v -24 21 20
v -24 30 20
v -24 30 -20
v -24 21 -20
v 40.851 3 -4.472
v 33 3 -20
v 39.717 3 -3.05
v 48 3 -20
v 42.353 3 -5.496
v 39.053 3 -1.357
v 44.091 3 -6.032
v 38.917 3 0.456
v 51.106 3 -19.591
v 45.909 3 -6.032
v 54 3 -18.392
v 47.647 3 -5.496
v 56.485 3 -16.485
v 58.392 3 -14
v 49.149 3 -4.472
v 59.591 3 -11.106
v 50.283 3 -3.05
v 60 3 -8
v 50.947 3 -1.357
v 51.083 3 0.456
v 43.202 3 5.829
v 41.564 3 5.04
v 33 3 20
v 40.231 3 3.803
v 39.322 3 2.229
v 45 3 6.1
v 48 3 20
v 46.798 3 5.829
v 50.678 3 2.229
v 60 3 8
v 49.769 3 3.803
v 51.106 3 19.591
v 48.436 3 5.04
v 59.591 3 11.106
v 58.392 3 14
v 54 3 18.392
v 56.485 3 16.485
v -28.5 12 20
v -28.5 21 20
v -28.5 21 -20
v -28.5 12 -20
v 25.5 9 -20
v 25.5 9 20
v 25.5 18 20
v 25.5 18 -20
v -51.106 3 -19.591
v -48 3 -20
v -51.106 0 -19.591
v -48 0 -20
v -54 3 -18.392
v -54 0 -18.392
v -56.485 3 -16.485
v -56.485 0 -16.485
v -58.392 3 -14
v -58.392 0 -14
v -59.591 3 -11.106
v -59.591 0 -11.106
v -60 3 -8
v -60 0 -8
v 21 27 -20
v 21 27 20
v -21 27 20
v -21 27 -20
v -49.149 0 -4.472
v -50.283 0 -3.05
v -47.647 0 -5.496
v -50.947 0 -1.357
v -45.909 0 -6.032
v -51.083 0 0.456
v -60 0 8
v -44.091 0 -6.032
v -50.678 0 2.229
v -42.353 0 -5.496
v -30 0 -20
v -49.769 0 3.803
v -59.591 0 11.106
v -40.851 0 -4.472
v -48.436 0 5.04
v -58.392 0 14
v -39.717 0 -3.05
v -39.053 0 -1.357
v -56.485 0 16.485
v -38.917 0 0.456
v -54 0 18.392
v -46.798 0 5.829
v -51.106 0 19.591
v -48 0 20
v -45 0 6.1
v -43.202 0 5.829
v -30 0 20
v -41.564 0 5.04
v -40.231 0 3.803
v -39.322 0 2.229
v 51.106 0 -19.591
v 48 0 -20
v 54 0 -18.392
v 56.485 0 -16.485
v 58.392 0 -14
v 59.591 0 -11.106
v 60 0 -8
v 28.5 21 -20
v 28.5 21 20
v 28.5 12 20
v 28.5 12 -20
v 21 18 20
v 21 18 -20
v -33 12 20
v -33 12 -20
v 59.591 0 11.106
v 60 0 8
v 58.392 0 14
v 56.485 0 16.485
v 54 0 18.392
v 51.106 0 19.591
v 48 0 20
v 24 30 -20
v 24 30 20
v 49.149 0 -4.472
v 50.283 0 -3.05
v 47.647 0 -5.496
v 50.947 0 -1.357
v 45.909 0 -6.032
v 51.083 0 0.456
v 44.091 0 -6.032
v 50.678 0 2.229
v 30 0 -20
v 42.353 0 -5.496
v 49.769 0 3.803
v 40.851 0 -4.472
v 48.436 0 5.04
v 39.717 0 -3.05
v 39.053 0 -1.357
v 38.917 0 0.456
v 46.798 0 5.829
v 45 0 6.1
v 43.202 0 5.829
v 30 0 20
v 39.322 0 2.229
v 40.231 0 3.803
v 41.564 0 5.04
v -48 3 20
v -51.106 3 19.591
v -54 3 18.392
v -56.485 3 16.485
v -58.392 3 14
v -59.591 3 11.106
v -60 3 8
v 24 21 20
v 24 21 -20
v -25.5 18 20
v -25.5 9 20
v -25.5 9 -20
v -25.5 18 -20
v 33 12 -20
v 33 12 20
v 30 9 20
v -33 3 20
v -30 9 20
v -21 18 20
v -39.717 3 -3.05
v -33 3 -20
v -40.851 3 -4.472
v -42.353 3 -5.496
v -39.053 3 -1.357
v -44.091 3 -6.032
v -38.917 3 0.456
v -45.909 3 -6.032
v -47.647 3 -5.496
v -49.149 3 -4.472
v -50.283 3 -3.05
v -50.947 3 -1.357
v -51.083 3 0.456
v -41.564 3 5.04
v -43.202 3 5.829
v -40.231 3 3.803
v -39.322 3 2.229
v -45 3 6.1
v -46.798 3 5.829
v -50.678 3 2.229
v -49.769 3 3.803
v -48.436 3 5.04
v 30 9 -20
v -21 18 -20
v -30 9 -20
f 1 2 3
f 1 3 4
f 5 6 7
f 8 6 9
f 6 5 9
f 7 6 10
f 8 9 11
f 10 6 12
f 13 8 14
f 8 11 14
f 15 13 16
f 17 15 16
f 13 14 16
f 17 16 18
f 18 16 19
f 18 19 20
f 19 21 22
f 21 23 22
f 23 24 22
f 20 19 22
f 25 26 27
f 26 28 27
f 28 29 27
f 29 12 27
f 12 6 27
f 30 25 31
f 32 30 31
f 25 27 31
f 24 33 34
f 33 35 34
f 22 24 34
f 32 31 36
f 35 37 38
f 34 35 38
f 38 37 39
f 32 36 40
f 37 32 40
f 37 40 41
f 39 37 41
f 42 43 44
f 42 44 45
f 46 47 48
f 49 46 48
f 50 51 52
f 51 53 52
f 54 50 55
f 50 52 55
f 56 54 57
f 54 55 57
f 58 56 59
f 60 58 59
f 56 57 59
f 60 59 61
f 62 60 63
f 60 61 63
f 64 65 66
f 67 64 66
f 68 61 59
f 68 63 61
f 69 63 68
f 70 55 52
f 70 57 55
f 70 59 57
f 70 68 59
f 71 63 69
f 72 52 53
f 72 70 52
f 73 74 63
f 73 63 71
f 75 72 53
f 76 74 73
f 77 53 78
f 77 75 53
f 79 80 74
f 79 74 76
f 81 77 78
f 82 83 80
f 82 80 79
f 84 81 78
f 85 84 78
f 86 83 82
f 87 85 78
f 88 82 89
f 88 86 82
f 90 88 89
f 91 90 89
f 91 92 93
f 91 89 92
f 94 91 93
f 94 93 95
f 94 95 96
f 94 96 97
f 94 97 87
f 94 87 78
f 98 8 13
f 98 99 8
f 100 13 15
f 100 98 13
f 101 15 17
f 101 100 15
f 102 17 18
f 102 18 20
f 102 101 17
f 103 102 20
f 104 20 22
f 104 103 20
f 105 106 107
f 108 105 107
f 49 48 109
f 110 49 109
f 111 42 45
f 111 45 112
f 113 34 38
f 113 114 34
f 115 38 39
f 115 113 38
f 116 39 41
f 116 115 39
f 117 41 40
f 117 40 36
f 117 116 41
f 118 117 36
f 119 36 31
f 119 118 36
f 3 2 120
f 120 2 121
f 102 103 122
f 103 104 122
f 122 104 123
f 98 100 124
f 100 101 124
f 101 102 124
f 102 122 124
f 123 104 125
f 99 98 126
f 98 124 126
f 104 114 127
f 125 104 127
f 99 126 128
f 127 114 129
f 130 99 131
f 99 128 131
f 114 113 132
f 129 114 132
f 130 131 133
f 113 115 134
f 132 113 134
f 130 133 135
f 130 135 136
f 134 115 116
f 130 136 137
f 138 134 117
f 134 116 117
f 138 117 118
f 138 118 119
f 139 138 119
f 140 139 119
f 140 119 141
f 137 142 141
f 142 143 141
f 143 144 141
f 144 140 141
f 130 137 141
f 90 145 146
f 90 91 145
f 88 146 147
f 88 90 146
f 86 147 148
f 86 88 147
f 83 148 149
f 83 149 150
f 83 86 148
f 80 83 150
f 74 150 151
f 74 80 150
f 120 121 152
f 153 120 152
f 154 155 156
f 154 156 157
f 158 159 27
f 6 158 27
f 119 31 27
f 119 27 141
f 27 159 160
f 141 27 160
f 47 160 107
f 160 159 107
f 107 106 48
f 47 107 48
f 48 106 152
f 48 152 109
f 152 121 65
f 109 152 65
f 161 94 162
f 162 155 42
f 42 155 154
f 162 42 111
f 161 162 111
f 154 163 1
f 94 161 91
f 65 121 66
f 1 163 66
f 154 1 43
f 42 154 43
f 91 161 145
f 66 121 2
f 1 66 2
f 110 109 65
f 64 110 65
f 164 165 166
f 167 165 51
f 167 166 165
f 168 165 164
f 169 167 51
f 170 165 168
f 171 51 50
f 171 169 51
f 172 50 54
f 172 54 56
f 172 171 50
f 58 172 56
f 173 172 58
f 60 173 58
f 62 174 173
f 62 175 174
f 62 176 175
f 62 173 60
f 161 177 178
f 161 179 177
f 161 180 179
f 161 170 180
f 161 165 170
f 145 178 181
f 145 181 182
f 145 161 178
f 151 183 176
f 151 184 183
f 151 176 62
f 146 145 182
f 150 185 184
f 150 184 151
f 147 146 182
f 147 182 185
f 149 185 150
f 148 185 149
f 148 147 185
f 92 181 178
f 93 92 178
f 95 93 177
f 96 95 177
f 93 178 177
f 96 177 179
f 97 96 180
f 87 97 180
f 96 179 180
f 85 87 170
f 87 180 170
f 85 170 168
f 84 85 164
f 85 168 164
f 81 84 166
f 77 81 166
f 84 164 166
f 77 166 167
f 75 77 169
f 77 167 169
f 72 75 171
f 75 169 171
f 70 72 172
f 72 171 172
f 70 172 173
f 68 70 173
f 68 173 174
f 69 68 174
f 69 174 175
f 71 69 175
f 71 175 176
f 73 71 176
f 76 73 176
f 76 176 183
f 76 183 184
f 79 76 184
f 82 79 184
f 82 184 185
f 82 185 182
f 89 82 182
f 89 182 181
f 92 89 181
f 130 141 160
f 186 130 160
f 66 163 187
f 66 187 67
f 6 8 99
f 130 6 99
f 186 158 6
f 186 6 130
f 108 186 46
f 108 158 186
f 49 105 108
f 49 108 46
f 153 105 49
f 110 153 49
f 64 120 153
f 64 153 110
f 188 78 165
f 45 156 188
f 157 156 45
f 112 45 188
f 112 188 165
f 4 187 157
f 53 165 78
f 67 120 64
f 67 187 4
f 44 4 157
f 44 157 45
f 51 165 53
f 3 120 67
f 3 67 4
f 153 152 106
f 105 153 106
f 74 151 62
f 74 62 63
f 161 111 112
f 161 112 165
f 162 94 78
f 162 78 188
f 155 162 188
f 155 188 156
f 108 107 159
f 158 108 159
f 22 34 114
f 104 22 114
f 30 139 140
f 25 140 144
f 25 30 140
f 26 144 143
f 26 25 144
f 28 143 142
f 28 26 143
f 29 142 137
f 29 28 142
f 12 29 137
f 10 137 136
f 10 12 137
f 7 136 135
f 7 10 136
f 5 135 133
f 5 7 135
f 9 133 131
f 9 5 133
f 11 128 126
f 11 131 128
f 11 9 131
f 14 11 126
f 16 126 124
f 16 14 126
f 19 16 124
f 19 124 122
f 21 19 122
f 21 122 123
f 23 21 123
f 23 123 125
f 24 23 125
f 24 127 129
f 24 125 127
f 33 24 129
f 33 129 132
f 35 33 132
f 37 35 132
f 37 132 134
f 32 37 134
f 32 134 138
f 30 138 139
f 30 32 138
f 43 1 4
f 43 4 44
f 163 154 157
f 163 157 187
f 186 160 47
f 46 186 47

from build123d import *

# Parameters (mm, degrees)
EXTRUDE_THIN1_DEPTH = 20
SKETCH4_R           = 6.1
CUT_EXTRUDE3_DEPTH  = 69.767724988
FILLET1_R           = 12


with BuildPart() as part:
    # Sketch1 → Extrude-Thin1 (new, symmetric)
    with BuildSketch(Plane.XY):
        Polygon((-60, 0), (-30, 0), (-30, 9), (-25.5, 9), (-25.5, 18), (-21, 18), (-21, 27), (0, 27), (0, 30), (-24, 30), (-24, 21), (-28.5, 21), (-28.5, 12), (-33, 12), (-33, 3), (-60, 3), align=None)
    extrude_thin1 = extrude(amount=EXTRUDE_THIN1_DEPTH, both=True)

    # Mirror1: Extrude-Thin1 across plane
    add(extrude_thin1.mirror(Plane(origin=(0, 30, -20), x_dir=(0, 0, 1), z_dir=(-1, 0, 0))))

    # Sketch4 → Cut-Extrude3 (cut, through all)
    with BuildSketch(Plane(origin=(0, 3, 0), x_dir=(1, 0, 0), z_dir=(0, 1, 0))):
        with Locations(Location((-45, 0, 0), (0, 0, 270))):
            Circle(SKETCH4_R)
    cut_extrude3 = extrude(amount=-CUT_EXTRUDE3_DEPTH, mode=Mode.SUBTRACT)

    # Mirror3: Cut-Extrude3 across plane
    add(cut_extrude3.mirror(Plane(origin=(0, 0, 0), x_dir=(0, 0, 1), z_dir=(1, 0, 0))), mode=Mode.SUBTRACT)

    # Fillet1
    fillet1_edges = [part.edges().sort_by_distance(p)[0] for p in [
        (-60, 1.5, 20),
        (-60, 1.5, -20),
        (60, 1.5, -20),
        (60, 1.5, 20),
    ]]
    fillet(fillet1_edges, radius=FILLET1_R)


solid = part.part
